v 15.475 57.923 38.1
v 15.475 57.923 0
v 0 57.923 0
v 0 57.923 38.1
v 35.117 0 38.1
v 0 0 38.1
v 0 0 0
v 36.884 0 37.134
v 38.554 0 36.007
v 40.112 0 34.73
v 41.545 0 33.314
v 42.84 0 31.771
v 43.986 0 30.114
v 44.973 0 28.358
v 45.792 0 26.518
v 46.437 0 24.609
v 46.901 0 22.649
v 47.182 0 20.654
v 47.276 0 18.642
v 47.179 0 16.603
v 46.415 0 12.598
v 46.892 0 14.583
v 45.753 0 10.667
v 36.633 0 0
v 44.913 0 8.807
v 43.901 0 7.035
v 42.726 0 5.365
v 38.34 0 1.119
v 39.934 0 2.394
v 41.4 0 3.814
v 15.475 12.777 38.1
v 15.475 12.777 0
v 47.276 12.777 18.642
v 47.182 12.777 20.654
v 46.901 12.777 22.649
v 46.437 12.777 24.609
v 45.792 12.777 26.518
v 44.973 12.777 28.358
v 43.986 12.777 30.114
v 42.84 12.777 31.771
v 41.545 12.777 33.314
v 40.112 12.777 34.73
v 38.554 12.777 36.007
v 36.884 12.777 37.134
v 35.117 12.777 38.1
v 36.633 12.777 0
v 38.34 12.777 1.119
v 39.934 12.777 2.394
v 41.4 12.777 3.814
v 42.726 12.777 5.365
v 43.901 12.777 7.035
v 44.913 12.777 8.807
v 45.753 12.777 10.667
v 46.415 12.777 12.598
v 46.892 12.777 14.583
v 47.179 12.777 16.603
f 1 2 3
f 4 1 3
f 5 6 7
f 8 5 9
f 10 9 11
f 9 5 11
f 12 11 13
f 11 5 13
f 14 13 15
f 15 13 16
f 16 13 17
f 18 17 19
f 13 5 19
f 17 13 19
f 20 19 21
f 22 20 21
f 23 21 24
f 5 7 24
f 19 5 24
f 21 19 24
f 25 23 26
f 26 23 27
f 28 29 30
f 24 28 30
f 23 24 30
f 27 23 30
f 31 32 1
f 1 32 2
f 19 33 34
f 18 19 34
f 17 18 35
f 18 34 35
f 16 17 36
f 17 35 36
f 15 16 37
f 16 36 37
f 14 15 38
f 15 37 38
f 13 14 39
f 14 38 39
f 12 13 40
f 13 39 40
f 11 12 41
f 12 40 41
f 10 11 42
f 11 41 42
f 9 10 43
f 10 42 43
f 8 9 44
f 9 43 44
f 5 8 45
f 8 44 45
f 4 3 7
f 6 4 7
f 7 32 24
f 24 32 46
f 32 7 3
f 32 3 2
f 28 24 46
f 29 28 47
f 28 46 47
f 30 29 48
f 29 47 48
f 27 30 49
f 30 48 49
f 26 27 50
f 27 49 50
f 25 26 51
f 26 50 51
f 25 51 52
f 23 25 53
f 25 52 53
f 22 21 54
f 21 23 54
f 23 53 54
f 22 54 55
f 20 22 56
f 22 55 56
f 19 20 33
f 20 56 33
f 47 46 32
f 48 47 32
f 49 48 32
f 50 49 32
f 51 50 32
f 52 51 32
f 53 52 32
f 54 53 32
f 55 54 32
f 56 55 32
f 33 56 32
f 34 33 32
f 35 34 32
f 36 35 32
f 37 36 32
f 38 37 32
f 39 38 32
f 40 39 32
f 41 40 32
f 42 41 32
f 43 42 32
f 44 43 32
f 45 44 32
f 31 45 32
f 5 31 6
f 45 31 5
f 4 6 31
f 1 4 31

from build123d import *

# Parameters (mm, degrees)
F1_DEPTH = 38.1
F3_DEPTH = 12.778172


with BuildPart() as f1:
    # F0 (on Top) → F1 (new body)
    with BuildSketch(Plane.XY):
        Polygon((0, 57.923168), (0, 0), (47.275532, 0), (47.275532, 12.777172), (15.474574, 12.777172), (15.474574, 57.923168), align=None)
    extrude(amount=F1_DEPTH)

    # F2 (on face) → F3 (cut, through all)
    with BuildSketch(Plane(origin=(0, 12.777172, 0), x_dir=(-1, 0, 0), z_dir=(0, 1, 0))):
        with BuildLine():
            ThreePointArc((-47.275532, 18.642101), (-43.985861, 30.114338), (-35.116624, 38.1))
            Line((-35.116624, 38.1), (-47.275532, 38.1))
            Line((-47.275532, 38.1), (-47.275532, 18.642101))
        make_face()
        with BuildLine():
            ThreePointArc((-36.633106, 0), (-44.4276, 7.909101), (-47.275532, 18.642101))
            Line((-47.275532, 18.642101), (-47.275532, 0))
            Line((-47.275532, 0), (-36.633106, 0))
        make_face()
    extrude(amount=-F3_DEPTH, mode=Mode.SUBTRACT)


solid = f1.part
